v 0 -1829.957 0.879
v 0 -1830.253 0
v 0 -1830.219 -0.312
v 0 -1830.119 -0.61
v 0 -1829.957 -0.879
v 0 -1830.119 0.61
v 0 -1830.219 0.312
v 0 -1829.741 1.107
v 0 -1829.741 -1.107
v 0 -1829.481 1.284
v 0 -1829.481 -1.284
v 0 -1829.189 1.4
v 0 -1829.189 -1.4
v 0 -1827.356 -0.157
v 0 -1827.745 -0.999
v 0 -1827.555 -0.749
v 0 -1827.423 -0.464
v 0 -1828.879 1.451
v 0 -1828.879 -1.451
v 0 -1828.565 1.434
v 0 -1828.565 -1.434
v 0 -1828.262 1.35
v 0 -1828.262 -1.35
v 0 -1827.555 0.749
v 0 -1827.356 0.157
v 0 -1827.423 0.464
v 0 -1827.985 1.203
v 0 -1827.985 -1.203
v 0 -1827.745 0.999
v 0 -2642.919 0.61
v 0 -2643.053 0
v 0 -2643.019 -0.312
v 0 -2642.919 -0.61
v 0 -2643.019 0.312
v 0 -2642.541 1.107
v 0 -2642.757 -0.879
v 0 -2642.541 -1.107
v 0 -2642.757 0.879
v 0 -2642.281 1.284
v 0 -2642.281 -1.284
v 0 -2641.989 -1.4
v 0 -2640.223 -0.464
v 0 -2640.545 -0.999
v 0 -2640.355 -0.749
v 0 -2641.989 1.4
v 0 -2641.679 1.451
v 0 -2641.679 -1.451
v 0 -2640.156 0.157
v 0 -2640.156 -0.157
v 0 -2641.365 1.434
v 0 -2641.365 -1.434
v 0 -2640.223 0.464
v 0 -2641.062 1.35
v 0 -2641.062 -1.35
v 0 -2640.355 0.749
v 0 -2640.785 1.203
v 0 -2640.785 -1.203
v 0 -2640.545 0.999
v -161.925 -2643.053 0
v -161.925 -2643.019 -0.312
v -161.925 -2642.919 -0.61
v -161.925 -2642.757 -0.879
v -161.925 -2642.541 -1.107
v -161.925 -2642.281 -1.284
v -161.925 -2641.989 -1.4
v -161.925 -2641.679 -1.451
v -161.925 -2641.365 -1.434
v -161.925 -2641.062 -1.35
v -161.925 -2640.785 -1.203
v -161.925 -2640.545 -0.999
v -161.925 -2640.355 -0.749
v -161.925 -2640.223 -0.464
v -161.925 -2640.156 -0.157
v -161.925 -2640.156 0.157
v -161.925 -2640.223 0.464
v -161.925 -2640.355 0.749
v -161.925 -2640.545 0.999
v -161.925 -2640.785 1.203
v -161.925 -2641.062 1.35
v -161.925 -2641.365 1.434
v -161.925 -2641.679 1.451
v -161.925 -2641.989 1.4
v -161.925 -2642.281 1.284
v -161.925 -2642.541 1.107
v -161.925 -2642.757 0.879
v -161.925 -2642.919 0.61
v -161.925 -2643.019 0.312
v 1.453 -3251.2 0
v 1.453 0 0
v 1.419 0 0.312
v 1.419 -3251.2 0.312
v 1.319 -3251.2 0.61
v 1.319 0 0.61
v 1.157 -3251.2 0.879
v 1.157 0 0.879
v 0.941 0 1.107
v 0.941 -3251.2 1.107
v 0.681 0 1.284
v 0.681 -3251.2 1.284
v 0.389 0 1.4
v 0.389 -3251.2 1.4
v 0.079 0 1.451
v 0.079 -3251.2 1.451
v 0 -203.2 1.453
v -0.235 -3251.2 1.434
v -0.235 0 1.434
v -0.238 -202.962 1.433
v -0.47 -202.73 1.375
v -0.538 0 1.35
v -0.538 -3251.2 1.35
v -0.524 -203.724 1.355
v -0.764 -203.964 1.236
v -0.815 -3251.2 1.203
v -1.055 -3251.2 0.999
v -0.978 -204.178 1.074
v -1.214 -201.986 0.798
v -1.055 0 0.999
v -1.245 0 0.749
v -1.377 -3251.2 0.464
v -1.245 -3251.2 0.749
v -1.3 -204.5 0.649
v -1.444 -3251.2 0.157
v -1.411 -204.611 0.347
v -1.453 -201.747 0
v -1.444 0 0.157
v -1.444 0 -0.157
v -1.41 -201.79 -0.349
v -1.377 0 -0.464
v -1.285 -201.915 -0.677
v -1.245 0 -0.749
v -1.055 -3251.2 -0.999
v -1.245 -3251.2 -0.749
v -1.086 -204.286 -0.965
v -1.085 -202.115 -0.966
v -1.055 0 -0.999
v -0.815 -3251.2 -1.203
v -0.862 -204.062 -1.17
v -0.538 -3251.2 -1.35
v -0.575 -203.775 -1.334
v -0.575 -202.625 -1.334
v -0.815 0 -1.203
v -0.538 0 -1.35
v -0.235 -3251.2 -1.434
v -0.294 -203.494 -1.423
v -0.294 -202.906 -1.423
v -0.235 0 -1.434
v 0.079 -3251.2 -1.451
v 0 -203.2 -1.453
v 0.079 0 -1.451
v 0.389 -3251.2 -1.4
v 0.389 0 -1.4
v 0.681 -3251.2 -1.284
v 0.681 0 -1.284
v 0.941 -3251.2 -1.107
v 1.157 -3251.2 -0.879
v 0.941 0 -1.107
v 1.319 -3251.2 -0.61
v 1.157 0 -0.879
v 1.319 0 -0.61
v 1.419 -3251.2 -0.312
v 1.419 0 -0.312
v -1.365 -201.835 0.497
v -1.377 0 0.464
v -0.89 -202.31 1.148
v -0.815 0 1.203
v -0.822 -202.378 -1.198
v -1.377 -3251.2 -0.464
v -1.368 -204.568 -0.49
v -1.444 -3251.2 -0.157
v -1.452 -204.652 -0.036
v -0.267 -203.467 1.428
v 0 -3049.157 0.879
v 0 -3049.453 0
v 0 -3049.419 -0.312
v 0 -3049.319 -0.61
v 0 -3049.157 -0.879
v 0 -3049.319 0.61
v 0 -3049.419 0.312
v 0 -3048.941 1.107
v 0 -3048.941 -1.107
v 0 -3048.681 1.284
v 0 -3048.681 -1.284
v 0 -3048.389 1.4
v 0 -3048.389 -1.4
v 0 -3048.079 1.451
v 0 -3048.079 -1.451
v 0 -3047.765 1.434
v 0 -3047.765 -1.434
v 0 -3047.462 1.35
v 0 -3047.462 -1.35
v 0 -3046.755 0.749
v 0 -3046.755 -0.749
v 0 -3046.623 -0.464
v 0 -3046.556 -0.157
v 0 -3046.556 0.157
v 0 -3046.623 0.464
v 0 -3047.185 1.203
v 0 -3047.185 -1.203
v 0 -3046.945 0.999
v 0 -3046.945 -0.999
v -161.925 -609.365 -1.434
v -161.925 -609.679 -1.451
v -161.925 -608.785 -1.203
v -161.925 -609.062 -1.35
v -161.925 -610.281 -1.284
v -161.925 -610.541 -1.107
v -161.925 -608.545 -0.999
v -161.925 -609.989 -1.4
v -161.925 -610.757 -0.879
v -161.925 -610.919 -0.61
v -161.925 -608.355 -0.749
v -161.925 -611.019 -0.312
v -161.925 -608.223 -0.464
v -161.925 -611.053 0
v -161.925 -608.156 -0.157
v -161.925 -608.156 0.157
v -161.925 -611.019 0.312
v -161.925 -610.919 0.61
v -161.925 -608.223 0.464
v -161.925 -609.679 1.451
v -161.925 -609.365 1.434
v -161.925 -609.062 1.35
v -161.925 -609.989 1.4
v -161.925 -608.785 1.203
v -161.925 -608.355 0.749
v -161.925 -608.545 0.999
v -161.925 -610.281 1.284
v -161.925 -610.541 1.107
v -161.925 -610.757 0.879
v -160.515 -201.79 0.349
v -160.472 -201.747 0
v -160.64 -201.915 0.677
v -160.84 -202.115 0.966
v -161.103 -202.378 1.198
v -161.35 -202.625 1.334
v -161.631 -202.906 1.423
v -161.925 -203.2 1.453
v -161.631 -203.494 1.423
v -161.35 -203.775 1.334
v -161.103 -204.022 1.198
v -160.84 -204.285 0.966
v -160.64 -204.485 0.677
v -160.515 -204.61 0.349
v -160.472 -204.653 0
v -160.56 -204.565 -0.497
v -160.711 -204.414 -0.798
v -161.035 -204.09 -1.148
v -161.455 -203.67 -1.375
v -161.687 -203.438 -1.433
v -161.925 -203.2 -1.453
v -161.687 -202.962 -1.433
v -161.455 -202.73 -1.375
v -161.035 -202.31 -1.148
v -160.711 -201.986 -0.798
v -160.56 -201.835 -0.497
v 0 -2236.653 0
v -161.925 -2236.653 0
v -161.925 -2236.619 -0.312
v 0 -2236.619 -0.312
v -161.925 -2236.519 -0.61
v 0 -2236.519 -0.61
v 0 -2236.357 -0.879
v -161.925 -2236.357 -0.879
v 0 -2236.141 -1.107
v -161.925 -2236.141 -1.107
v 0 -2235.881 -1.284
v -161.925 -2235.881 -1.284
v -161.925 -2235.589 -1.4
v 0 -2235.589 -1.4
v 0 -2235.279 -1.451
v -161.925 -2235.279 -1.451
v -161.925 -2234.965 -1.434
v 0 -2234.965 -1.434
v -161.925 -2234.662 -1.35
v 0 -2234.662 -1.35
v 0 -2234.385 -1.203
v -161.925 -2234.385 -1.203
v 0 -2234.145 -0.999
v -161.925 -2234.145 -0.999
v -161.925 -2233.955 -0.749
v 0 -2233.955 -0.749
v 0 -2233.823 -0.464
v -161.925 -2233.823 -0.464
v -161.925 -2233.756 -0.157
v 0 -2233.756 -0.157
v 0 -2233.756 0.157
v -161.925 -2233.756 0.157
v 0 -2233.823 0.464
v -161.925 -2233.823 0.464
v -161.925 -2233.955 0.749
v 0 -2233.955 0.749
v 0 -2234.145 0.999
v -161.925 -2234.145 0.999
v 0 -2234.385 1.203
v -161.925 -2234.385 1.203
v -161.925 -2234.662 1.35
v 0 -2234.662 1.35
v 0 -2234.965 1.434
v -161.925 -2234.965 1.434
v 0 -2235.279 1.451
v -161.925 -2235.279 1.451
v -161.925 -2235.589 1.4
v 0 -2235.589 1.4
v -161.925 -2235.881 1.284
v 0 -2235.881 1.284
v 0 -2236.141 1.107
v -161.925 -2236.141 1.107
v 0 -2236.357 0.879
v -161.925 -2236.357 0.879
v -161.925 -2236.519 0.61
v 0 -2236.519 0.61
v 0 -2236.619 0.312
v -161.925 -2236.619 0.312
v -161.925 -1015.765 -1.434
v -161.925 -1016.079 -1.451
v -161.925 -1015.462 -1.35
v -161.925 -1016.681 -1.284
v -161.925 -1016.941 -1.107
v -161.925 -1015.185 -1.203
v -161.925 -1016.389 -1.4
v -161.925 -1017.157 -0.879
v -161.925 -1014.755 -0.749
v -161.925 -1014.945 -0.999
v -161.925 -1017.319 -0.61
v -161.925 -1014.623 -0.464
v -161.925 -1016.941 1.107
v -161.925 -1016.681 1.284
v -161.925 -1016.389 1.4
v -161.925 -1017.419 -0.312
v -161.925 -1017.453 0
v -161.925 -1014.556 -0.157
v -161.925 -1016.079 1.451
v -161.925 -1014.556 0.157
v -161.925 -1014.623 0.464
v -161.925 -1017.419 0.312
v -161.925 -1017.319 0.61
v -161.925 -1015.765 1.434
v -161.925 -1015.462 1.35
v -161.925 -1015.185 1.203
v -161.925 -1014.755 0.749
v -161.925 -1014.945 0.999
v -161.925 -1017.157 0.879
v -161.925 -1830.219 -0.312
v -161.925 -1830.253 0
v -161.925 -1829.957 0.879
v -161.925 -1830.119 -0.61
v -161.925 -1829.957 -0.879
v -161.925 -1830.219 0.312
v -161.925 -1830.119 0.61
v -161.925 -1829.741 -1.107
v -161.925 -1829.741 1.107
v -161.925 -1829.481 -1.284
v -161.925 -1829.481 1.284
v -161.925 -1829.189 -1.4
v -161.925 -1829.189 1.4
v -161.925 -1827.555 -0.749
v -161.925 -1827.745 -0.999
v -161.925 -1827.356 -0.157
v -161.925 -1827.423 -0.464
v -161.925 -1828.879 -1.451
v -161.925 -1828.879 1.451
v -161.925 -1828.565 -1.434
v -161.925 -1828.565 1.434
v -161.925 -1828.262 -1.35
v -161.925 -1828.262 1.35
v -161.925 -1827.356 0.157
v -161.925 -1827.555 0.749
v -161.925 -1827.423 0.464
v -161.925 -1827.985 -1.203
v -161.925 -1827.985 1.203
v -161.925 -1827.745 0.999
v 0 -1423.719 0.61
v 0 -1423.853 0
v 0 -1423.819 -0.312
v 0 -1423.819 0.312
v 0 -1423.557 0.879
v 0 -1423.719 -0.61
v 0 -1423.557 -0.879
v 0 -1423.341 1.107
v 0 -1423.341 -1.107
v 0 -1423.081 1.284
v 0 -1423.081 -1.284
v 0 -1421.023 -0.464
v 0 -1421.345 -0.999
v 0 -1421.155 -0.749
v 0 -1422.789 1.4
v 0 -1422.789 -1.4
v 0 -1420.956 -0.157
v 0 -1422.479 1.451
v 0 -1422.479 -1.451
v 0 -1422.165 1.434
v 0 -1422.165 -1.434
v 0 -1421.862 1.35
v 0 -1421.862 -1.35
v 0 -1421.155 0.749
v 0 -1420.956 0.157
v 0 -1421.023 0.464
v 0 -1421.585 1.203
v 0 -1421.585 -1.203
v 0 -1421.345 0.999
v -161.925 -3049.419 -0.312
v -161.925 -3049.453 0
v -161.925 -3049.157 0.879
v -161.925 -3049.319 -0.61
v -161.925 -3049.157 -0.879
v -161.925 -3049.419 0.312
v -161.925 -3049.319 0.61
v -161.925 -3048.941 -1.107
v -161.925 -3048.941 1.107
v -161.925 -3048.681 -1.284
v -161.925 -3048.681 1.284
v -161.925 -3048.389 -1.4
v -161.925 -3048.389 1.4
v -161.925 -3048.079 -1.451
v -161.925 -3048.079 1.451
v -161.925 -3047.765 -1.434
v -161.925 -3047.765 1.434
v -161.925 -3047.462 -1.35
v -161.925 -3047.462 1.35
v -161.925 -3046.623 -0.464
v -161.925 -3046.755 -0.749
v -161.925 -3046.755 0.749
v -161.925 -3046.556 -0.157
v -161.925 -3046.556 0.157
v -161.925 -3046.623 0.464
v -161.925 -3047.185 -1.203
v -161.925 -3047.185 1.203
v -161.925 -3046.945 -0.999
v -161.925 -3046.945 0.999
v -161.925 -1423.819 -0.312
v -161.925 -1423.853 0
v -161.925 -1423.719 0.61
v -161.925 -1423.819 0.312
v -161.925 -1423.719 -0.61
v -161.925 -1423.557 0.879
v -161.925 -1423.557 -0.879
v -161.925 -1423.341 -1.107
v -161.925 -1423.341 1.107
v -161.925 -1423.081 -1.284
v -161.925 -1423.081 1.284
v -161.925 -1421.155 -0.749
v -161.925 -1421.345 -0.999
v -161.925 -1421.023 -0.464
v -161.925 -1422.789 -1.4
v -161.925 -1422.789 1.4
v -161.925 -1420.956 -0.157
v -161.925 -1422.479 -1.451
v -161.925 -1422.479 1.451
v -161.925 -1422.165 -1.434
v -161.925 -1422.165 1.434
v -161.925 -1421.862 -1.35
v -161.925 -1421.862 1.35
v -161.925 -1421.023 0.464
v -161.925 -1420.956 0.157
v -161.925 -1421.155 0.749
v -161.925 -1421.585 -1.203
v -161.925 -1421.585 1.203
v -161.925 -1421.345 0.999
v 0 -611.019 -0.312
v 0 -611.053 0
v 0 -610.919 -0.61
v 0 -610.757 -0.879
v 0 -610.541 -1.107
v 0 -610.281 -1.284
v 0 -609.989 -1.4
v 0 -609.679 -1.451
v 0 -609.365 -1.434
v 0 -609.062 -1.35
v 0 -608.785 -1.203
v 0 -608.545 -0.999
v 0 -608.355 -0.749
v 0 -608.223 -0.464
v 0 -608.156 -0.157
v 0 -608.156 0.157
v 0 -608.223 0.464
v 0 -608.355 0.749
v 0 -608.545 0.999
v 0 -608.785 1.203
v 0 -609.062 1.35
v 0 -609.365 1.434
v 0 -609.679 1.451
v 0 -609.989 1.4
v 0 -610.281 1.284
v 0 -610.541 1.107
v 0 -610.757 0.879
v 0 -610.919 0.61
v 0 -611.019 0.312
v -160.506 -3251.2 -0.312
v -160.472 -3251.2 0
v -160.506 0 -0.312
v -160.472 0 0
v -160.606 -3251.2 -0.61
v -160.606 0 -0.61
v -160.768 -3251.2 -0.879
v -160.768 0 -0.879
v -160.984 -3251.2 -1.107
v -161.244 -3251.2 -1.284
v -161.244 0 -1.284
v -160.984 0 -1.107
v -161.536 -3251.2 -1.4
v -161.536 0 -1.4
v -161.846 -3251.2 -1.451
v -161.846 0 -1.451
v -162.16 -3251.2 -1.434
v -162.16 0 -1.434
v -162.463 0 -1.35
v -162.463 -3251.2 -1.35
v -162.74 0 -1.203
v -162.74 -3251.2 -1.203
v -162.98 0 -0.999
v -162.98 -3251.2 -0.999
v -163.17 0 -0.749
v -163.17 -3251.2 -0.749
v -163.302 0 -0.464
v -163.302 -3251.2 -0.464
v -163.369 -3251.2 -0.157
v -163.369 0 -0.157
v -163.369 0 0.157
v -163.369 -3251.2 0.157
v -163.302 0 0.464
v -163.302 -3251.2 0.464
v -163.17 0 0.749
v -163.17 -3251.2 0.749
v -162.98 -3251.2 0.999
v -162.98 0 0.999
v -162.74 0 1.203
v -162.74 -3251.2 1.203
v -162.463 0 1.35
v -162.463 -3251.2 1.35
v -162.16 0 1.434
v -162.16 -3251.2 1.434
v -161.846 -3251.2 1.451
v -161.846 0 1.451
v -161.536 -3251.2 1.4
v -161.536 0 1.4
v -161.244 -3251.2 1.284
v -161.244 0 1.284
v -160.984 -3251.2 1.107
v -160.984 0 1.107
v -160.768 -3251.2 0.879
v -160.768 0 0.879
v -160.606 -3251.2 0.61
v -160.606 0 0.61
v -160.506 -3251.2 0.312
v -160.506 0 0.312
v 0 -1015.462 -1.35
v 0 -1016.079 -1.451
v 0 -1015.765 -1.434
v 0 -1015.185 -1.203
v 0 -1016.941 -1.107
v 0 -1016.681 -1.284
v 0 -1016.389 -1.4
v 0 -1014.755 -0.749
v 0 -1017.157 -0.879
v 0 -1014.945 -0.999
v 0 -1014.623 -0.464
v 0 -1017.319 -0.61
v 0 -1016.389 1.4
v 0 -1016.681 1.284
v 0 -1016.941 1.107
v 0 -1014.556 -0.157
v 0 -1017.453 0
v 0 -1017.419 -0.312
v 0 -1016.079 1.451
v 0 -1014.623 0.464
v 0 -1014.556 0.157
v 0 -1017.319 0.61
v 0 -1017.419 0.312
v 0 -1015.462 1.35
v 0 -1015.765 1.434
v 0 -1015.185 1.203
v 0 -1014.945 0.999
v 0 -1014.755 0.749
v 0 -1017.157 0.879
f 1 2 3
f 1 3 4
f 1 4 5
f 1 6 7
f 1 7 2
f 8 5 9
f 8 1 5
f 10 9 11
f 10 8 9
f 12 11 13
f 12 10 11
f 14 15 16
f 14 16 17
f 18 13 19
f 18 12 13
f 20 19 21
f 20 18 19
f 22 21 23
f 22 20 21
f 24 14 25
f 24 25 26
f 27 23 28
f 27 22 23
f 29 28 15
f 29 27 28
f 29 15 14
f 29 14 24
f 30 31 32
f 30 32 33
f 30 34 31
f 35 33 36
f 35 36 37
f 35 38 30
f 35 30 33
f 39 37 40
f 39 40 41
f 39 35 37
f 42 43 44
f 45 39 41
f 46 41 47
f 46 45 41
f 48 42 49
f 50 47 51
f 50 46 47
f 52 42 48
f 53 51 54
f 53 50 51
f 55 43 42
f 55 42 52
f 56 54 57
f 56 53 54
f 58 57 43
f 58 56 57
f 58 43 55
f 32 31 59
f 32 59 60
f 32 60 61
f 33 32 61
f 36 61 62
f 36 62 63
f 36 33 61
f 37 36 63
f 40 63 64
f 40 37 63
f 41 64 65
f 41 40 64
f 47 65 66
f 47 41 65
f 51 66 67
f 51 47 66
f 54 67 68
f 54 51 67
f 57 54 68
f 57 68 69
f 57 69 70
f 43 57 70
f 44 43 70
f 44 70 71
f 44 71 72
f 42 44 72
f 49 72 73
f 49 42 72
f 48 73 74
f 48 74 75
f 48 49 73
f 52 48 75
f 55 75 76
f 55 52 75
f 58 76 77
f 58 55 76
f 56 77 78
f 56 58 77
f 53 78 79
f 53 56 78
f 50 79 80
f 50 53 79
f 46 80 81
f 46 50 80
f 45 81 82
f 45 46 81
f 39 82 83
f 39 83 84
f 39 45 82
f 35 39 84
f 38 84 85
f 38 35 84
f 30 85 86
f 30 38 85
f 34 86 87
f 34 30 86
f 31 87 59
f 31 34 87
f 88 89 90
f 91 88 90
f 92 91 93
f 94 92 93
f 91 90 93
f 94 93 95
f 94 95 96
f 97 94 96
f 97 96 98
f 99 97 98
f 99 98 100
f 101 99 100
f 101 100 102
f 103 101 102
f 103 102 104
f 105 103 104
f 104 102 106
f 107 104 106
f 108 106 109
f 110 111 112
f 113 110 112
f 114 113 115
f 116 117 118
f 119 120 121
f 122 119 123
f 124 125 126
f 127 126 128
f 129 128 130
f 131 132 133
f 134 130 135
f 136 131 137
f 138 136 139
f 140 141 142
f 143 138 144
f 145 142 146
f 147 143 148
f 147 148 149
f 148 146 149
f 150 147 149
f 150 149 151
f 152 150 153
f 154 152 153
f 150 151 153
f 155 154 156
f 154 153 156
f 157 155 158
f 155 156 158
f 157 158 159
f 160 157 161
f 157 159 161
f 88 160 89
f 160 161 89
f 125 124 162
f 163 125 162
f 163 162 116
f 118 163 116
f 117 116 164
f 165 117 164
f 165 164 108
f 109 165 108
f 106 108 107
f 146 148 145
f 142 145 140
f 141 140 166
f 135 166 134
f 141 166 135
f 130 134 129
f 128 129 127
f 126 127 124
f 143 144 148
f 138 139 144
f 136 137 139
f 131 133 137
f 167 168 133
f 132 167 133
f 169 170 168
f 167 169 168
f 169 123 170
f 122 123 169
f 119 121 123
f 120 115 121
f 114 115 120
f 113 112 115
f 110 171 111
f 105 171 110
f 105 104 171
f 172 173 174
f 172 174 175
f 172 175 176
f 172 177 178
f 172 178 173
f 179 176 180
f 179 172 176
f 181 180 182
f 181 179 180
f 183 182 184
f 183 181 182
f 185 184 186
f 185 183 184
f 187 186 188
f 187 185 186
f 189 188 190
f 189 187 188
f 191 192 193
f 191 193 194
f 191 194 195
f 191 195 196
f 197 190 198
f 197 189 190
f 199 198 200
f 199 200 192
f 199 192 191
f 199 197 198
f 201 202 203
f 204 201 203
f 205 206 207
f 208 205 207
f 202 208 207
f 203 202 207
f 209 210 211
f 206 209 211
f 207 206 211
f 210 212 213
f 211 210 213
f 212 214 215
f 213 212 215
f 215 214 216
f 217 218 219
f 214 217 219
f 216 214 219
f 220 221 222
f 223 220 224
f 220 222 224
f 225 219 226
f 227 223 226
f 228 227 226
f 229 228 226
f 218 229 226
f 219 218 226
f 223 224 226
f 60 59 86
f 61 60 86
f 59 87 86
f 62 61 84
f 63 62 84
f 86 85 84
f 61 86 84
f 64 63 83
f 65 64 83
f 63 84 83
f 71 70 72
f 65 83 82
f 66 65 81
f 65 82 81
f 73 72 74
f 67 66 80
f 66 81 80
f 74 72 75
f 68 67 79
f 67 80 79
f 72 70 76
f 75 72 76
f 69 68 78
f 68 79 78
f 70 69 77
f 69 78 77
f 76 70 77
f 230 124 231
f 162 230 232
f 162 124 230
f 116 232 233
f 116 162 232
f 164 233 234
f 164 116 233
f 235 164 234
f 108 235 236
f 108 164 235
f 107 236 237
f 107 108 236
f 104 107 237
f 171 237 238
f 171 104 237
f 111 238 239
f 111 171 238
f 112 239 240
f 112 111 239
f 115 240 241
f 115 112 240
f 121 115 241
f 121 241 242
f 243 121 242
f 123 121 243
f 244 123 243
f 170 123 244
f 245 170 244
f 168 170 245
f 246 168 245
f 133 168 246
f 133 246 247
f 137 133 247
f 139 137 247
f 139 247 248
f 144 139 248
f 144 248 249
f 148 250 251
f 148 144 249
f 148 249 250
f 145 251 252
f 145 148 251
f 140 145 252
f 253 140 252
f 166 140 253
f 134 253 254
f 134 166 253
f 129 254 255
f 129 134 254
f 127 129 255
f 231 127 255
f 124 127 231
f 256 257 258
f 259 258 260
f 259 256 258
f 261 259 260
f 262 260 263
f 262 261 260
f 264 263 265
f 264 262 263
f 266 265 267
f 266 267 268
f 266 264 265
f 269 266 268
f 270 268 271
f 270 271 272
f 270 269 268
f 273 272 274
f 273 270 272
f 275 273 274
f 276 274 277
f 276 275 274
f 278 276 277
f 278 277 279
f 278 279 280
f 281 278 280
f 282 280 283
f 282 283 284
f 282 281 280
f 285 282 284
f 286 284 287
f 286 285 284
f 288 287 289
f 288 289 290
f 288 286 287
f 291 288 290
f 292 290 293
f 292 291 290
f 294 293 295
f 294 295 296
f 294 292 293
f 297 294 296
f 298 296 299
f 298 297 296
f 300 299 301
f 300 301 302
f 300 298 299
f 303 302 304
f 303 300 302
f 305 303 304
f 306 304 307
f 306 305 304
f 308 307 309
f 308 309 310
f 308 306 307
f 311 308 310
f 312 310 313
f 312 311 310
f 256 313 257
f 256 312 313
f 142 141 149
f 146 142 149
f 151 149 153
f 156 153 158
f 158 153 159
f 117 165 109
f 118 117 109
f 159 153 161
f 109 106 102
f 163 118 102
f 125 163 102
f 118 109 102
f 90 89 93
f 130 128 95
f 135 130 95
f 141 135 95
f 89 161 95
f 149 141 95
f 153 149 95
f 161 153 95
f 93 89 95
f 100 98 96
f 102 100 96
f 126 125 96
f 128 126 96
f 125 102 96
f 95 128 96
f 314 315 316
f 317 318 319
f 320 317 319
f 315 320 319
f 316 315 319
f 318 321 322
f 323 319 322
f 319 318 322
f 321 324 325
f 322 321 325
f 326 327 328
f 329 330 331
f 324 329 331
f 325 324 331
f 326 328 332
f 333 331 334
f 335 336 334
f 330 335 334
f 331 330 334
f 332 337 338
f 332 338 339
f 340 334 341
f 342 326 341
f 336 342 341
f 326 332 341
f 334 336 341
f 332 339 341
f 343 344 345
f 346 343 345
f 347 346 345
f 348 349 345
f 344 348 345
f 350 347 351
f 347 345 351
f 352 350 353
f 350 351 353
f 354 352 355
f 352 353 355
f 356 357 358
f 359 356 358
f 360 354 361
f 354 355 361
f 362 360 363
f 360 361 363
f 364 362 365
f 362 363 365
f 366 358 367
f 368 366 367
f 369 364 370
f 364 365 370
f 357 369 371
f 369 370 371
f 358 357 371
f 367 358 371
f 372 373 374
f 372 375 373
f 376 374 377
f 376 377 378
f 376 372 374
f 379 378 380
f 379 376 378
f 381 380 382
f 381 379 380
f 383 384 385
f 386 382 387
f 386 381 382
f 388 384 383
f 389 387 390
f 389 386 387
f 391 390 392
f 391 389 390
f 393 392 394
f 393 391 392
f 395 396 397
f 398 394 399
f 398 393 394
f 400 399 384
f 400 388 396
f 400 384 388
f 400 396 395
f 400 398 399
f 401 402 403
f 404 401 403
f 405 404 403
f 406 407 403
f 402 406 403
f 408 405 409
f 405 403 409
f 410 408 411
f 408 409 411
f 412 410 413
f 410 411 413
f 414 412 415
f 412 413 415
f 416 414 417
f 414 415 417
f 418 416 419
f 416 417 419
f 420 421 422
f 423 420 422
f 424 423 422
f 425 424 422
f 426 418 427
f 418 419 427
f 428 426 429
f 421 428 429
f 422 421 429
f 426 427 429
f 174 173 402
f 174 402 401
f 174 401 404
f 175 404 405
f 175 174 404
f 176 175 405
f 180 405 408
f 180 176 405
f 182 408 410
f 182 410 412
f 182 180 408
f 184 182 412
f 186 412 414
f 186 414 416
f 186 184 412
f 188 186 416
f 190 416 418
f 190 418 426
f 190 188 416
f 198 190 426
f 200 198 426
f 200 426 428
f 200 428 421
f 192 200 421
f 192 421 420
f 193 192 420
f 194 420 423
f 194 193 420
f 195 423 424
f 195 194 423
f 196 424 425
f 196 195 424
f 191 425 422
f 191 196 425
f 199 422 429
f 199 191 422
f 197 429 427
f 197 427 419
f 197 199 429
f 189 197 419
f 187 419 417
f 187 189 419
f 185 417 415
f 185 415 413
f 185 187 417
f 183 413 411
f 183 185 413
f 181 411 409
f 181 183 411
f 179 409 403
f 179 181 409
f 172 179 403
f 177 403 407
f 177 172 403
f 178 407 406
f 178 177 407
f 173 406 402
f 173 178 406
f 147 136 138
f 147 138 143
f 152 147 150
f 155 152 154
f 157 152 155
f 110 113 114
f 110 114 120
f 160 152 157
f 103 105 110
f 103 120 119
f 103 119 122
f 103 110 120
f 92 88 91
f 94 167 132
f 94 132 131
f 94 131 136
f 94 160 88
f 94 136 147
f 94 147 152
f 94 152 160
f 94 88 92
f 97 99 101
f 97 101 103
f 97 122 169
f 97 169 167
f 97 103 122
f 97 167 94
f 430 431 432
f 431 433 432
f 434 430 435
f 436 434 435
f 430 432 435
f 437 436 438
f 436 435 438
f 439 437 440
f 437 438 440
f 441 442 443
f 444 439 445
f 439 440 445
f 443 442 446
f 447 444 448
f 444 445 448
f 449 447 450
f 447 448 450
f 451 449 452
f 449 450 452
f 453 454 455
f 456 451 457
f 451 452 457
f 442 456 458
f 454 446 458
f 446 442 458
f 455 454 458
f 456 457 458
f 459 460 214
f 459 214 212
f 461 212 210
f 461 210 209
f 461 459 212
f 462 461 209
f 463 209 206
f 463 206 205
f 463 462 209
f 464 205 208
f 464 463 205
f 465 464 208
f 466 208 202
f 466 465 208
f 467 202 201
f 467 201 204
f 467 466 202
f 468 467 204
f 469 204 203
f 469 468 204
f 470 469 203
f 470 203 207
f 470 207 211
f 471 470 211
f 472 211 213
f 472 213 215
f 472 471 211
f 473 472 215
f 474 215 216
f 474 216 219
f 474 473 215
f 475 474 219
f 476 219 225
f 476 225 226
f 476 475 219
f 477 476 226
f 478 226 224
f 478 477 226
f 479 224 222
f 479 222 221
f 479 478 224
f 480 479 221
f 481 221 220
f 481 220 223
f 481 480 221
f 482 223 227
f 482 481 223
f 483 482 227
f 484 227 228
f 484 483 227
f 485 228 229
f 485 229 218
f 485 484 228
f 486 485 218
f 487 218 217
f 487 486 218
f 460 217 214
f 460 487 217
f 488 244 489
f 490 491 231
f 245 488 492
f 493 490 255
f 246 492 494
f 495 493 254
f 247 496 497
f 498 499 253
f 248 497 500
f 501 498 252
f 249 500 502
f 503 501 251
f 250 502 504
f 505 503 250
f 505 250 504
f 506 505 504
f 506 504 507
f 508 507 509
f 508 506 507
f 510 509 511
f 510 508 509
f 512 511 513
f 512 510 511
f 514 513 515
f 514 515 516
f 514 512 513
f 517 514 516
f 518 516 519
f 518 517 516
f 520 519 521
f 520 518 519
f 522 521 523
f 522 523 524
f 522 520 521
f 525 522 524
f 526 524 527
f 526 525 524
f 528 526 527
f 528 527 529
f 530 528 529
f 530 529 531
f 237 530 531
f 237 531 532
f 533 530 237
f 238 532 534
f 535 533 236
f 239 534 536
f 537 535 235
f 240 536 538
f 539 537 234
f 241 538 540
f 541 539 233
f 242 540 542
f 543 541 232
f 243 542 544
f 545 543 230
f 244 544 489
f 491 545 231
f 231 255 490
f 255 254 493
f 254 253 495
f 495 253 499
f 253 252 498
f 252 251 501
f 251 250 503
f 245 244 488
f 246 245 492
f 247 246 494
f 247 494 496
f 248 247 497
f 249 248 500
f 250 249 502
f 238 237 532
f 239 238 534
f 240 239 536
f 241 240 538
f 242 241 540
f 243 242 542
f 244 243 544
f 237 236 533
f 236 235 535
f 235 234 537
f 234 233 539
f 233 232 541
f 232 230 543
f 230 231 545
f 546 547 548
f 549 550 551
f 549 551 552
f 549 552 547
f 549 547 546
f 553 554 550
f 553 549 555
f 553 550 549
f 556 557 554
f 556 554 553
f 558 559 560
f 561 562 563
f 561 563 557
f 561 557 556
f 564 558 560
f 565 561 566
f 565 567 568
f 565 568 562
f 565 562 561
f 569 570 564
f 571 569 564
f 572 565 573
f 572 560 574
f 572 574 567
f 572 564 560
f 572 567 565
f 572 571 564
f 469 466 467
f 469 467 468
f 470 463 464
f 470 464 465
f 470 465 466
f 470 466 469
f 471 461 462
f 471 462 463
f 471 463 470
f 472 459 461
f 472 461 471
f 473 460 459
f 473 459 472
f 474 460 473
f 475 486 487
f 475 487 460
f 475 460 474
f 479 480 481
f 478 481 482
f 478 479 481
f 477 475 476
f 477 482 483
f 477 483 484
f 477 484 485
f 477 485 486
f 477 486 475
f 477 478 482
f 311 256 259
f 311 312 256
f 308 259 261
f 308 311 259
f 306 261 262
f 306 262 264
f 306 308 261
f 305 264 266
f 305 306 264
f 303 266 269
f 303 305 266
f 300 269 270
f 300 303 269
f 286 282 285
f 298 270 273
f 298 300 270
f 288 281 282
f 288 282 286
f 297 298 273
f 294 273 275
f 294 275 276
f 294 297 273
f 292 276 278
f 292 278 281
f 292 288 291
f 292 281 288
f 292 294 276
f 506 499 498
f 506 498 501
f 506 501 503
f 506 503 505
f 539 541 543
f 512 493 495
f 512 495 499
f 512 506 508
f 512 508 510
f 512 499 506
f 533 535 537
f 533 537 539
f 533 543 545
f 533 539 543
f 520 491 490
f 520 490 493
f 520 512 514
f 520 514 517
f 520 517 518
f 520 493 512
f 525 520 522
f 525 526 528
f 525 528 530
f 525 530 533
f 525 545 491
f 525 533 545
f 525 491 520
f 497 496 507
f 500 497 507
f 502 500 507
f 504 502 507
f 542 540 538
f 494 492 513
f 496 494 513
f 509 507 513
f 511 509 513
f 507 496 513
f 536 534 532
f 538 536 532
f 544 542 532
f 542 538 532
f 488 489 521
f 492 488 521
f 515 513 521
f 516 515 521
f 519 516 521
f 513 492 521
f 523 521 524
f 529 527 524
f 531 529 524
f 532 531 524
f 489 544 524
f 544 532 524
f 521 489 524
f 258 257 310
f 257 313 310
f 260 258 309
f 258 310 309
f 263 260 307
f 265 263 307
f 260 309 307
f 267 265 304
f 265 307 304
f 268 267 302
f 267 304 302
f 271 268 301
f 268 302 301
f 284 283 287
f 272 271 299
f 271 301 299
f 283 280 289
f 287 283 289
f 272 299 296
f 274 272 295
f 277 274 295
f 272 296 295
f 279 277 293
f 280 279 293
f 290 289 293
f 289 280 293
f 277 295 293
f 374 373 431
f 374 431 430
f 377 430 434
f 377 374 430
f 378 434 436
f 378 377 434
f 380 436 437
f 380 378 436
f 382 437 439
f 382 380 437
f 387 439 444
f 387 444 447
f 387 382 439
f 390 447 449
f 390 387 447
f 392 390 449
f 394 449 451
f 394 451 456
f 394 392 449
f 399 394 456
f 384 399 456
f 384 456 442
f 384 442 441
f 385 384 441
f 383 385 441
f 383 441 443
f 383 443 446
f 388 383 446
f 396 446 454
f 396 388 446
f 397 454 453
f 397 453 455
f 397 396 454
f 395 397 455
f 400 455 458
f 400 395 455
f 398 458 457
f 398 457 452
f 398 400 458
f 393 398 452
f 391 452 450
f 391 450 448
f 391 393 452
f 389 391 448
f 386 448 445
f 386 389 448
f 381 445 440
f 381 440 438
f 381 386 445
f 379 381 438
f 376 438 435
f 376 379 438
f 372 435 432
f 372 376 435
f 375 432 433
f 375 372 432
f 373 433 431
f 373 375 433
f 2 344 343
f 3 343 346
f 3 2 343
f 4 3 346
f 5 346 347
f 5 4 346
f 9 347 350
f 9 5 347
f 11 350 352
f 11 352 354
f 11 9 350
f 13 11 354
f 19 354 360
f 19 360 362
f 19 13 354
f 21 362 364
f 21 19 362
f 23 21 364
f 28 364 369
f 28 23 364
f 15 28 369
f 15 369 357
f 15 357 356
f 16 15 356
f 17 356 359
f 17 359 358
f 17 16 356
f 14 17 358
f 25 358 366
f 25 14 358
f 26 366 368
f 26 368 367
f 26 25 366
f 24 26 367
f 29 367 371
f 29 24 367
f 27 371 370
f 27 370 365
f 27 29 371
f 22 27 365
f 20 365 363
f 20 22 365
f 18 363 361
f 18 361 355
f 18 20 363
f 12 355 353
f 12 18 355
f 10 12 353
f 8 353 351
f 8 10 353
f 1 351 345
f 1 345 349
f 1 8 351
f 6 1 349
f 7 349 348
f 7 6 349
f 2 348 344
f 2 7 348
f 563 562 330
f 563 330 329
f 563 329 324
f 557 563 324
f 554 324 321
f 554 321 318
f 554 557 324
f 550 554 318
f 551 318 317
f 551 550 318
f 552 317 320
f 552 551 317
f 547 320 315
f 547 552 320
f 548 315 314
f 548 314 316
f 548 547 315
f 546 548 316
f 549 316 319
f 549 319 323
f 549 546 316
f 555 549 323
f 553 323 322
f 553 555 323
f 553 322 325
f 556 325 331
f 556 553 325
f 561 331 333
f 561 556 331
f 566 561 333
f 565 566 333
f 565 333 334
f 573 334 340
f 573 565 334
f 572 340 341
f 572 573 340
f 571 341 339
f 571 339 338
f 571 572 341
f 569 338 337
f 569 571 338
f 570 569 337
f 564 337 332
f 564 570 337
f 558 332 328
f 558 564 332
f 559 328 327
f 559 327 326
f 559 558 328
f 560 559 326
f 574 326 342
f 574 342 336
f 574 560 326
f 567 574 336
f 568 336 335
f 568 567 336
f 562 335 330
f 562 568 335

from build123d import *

# Parameters (mm, degrees)
F0_R     = 1.45288
F1_DEPTH = 3251.2
F3_DEPTH = 3251.2
F4_R     = 1.45288
F5_DEPTH = 161.925
F7_DEPTH = 161.925


with BuildPart() as f1:
    # F0 (on Front) → F1 (new body)
    with BuildSketch(Plane.XZ):
        Circle(F0_R)
    extrude(amount=F1_DEPTH)



with BuildPart() as f3:
    # F2 (on face) → F3 (new body)
    with BuildSketch(Plane(origin=(0, 0, 0), x_dir=(-1, 0, 0), z_dir=(0, 1, 0))):
        with BuildLine():
            ThreePointArc((163.37788, 0), (161.925, 1.45288), (160.47212, 0))
            ThreePointArc((160.47212, 0), (161.925, -1.45288), (163.37788, 0))
        make_face()
    extrude(amount=-F3_DEPTH)


with BuildPart() as f1_1:
    add(f1.part)

    add(f3.part)  # F5 merges F3
    # F4 (on Right) → F5 (join)
    with BuildSketch(Plane.YZ):
        with Locations((-203.2, 0)):
            Circle(F4_R)
    extrude(amount=-F5_DEPTH)


with BuildPart() as f7:
    # F6 (on Right) → F7 (new body)
    with BuildSketch(Plane.YZ):
        with BuildLine():
            Line((-609.6, 0), (-608.14712, 0))
            ThreePointArc((-608.14712, 0), (-609.6, 1.45288), (-611.05288, 0))
            Line((-611.05288, 0), (-609.6, 0))
        make_face()
        with BuildLine():
            ThreePointArc((-611.05288, 0), (-609.6, -1.45288), (-608.14712, 0))
            Line((-608.14712, 0), (-609.6, 0))
            Line((-609.6, 0), (-611.05288, 0))
        make_face()
        with BuildLine():
            Line((-1016, 0), (-1014.54712, 0))
            ThreePointArc((-1014.54712, 0), (-1016, 1.45288), (-1017.45288, 0))
            Line((-1017.45288, 0), (-1016, 0))
        make_face()
        with BuildLine():
            ThreePointArc((-1017.45288, 0), (-1016, -1.45288), (-1014.54712, 0))
            Line((-1014.54712, 0), (-1016, 0))
            Line((-1016, 0), (-1017.45288, 0))
        make_face()
        with BuildLine():
            Line((-1422.4, 0), (-1420.94712, 0))
            ThreePointArc((-1420.94712, 0), (-1422.4, 1.45288), (-1423.85288, 0))
            Line((-1423.85288, 0), (-1422.4, 0))
        make_face()
        with BuildLine():
            ThreePointArc((-1423.85288, 0), (-1422.4, -1.45288), (-1420.94712, 0))
            Line((-1420.94712, 0), (-1422.4, 0))
            Line((-1422.4, 0), (-1423.85288, 0))
        make_face()
        with BuildLine():
            Line((-1828.8, 0), (-1827.34712, 0))
            ThreePointArc((-1827.34712, 0), (-1828.8, 1.45288), (-1830.25288, 0))
            Line((-1830.25288, 0), (-1828.8, 0))
        make_face()
        with BuildLine():
            ThreePointArc((-1830.25288, 0), (-1828.8, -1.45288), (-1827.34712, 0))
            Line((-1827.34712, 0), (-1828.8, 0))
            Line((-1828.8, 0), (-1830.25288, 0))
        make_face()
        with BuildLine():
            Line((-2235.2, 0), (-2233.74712, 0))
            ThreePointArc((-2233.74712, 0), (-2235.2, 1.45288), (-2236.65288, 0))
            Line((-2236.65288, 0), (-2235.2, 0))
        make_face()
        with BuildLine():
            ThreePointArc((-2236.65288, 0), (-2235.2, -1.45288), (-2233.74712, 0))
            Line((-2233.74712, 0), (-2235.2, 0))
            Line((-2235.2, 0), (-2236.65288, 0))
        make_face()
        with BuildLine():
            Line((-2641.6, 0), (-2640.14712, 0))
            ThreePointArc((-2640.14712, 0), (-2641.6, 1.45288), (-2643.05288, 0))
            Line((-2643.05288, 0), (-2641.6, 0))
        make_face()
        with BuildLine():
            ThreePointArc((-2643.05288, 0), (-2641.6, -1.45288), (-2640.14712, 0))
            Line((-2640.14712, 0), (-2641.6, 0))
            Line((-2641.6, 0), (-2643.05288, 0))
        make_face()
        with BuildLine():
            Line((-3048, 0), (-3046.54712, 0))
            ThreePointArc((-3046.54712, 0), (-3048, 1.45288), (-3049.45288, 0))
            Line((-3049.45288, 0), (-3048, 0))
        make_face()
        with BuildLine():
            ThreePointArc((-3049.45288, 0), (-3048, -1.45288), (-3046.54712, 0))
            Line((-3046.54712, 0), (-3048, 0))
            Line((-3048, 0), (-3049.45288, 0))
        make_face()
    extrude(amount=-F7_DEPTH)


solid = Compound([f1_1.part, f7.part])
